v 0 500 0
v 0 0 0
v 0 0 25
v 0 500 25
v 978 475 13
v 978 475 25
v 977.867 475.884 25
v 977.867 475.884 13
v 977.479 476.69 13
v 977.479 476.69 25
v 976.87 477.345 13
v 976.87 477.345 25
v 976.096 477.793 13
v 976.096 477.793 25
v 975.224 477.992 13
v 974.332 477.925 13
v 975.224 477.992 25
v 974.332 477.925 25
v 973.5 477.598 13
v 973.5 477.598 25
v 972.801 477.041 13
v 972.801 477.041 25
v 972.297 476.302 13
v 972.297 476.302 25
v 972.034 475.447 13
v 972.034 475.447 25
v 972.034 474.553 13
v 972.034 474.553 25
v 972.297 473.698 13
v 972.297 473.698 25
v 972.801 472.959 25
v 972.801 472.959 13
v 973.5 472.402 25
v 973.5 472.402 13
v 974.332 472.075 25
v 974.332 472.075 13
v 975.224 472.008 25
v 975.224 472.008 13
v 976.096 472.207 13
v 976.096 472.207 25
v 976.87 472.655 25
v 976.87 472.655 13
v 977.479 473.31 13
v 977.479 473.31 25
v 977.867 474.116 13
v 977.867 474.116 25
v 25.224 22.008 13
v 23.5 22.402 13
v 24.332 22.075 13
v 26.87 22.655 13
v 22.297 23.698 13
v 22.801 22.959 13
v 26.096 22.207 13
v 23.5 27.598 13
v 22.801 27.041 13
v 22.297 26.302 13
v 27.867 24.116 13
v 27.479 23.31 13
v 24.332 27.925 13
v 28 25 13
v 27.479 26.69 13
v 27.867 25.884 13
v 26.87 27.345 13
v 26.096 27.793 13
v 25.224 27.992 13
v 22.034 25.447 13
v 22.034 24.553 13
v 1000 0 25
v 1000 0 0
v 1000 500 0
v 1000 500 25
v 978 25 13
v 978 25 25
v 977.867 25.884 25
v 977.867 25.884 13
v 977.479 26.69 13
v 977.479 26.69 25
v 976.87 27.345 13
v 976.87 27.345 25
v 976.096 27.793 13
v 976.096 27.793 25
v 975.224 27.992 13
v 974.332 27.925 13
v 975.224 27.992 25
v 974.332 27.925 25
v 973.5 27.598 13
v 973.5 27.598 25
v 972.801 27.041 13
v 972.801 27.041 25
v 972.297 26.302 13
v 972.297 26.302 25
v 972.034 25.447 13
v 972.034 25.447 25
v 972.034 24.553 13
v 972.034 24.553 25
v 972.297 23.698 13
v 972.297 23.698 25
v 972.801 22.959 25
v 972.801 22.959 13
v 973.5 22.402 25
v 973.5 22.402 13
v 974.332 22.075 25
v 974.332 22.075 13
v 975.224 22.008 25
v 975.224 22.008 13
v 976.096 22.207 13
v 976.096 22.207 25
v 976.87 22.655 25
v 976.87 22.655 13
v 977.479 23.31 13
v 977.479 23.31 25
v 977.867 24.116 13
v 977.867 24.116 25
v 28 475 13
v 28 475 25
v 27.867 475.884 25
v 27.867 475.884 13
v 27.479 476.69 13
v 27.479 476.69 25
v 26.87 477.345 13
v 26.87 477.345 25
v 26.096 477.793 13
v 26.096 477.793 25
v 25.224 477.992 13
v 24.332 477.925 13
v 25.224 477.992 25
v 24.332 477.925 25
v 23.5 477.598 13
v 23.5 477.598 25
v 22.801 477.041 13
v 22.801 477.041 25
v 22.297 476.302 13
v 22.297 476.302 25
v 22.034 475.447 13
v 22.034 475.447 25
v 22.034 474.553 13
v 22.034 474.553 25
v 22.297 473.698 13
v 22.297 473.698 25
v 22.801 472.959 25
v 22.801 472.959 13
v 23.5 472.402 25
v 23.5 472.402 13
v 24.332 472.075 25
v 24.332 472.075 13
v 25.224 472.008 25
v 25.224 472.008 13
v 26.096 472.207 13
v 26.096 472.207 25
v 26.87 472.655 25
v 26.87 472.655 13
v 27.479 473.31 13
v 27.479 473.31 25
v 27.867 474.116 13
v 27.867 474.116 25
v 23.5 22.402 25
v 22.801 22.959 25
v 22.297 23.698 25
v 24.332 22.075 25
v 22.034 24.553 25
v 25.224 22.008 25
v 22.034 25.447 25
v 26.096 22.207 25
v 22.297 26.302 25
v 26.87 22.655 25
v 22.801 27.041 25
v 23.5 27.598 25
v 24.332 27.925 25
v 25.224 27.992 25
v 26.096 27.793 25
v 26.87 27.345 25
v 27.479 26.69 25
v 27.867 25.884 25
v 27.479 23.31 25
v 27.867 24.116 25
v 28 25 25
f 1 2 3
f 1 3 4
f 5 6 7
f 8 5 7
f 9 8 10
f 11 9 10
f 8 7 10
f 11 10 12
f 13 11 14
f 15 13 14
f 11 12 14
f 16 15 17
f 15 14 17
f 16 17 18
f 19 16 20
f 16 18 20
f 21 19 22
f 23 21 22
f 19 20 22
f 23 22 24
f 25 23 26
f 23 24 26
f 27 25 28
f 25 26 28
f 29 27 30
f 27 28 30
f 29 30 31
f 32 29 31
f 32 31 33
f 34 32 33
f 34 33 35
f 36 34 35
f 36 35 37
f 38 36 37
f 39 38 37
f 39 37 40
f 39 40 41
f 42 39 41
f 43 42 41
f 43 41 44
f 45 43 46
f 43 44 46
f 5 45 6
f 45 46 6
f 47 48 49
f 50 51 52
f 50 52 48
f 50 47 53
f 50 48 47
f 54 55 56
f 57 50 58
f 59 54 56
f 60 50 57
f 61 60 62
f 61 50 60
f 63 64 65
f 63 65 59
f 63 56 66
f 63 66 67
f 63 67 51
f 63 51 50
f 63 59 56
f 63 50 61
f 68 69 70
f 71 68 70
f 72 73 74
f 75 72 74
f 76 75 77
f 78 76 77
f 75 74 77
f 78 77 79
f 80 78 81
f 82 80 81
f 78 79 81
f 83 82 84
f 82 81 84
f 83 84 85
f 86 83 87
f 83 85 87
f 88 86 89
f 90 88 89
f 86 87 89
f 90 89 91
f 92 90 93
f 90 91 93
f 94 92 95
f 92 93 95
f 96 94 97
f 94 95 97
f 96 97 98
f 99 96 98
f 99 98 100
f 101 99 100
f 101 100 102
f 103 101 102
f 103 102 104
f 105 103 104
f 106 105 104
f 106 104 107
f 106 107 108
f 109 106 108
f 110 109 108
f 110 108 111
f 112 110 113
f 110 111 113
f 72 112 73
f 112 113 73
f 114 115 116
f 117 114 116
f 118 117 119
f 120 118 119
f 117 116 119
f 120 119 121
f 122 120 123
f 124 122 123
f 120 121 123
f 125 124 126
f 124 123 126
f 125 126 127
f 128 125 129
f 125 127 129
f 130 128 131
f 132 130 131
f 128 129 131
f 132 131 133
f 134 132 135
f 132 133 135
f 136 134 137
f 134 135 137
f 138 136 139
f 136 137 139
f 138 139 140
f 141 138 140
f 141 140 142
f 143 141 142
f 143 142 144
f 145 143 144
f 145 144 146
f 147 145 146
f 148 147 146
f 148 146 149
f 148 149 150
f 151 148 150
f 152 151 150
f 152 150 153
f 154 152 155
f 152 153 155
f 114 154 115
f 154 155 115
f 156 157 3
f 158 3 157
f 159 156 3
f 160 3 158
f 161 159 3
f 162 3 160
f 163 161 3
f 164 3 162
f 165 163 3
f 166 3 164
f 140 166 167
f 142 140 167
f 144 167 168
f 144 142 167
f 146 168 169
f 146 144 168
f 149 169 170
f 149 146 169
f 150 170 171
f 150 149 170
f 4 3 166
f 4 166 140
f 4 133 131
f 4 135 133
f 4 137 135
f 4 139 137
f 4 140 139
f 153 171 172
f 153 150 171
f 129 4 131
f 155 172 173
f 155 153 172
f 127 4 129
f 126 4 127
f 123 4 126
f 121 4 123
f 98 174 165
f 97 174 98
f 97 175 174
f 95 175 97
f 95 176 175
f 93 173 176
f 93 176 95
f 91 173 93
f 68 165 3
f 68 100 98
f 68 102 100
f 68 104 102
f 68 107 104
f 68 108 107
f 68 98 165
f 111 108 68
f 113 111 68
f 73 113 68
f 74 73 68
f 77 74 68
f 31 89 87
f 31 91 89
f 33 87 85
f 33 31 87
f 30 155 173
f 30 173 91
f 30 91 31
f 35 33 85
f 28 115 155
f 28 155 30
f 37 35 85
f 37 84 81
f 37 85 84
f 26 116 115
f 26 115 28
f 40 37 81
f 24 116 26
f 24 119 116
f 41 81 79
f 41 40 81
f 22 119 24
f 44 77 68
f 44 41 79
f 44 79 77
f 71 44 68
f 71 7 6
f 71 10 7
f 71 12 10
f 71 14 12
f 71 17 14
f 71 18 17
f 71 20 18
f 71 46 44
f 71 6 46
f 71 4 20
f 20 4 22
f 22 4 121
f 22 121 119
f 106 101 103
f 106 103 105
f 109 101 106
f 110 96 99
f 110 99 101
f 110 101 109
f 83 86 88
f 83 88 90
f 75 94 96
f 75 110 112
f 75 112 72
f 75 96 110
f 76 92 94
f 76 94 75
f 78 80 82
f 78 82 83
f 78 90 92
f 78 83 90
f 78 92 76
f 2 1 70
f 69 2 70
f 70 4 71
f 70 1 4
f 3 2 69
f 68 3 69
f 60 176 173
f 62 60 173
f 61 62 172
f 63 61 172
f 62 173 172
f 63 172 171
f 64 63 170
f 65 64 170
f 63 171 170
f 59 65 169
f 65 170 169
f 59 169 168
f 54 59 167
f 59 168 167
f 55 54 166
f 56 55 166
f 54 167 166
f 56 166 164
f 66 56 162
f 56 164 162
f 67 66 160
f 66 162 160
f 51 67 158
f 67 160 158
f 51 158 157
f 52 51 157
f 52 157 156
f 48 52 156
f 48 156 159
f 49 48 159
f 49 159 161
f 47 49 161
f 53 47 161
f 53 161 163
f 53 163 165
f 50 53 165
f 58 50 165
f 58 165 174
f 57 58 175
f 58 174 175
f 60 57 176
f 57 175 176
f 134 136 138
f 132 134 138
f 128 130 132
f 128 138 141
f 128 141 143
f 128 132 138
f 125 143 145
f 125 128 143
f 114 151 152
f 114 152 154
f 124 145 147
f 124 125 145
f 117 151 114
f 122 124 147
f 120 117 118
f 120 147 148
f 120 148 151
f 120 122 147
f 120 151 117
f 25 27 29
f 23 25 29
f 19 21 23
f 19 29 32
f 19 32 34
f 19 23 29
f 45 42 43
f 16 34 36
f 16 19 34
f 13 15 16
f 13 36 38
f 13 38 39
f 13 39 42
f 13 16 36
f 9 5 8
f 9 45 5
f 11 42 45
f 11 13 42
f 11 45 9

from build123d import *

# Parameters (mm, degrees)
F0_W     = 1000
F0_H     = 500
F1_DEPTH = 25
F2_W     = 50
F2_H     = 50
F3_DEPTH = 24
F4_R     = 3
F5_DEPTH = 12
F6_R     = 3
F7_DEPTH = 12


with BuildPart() as f1:
    # F0 (on Top) → F1 (new body)
    with BuildSketch(Plane.XY):
        with Locations((500, 250)):
            Rectangle(F0_W, F0_H)
    extrude(amount=F1_DEPTH)

    # F2 (on face) → F3 (join)
    with BuildSketch(Plane.XY.offset(25)):
        with Locations((25, 475)):
            Rectangle(F2_W, F2_H)
        with Locations((25, 25)):
            Rectangle(F2_W, F2_H)
    extrude(amount=-F3_DEPTH)

    # F4 (on face) → F5 (cut)
    with BuildSketch(Plane.XY.offset(25)):
        with Locations((975, 475)):
            Circle(F4_R)
        with Locations((975, 25)):
            Circle(F4_R)
    extrude(amount=-F5_DEPTH, mode=Mode.SUBTRACT)

    # F6 (on face) → F7 (cut)
    with BuildSketch(Plane.XY.offset(25)):
        with Locations((25, 475)):
            Circle(F6_R)
        with Locations((25, 25)):
            Circle(F6_R)
    extrude(amount=-F7_DEPTH, mode=Mode.SUBTRACT)


solid = f1.part
